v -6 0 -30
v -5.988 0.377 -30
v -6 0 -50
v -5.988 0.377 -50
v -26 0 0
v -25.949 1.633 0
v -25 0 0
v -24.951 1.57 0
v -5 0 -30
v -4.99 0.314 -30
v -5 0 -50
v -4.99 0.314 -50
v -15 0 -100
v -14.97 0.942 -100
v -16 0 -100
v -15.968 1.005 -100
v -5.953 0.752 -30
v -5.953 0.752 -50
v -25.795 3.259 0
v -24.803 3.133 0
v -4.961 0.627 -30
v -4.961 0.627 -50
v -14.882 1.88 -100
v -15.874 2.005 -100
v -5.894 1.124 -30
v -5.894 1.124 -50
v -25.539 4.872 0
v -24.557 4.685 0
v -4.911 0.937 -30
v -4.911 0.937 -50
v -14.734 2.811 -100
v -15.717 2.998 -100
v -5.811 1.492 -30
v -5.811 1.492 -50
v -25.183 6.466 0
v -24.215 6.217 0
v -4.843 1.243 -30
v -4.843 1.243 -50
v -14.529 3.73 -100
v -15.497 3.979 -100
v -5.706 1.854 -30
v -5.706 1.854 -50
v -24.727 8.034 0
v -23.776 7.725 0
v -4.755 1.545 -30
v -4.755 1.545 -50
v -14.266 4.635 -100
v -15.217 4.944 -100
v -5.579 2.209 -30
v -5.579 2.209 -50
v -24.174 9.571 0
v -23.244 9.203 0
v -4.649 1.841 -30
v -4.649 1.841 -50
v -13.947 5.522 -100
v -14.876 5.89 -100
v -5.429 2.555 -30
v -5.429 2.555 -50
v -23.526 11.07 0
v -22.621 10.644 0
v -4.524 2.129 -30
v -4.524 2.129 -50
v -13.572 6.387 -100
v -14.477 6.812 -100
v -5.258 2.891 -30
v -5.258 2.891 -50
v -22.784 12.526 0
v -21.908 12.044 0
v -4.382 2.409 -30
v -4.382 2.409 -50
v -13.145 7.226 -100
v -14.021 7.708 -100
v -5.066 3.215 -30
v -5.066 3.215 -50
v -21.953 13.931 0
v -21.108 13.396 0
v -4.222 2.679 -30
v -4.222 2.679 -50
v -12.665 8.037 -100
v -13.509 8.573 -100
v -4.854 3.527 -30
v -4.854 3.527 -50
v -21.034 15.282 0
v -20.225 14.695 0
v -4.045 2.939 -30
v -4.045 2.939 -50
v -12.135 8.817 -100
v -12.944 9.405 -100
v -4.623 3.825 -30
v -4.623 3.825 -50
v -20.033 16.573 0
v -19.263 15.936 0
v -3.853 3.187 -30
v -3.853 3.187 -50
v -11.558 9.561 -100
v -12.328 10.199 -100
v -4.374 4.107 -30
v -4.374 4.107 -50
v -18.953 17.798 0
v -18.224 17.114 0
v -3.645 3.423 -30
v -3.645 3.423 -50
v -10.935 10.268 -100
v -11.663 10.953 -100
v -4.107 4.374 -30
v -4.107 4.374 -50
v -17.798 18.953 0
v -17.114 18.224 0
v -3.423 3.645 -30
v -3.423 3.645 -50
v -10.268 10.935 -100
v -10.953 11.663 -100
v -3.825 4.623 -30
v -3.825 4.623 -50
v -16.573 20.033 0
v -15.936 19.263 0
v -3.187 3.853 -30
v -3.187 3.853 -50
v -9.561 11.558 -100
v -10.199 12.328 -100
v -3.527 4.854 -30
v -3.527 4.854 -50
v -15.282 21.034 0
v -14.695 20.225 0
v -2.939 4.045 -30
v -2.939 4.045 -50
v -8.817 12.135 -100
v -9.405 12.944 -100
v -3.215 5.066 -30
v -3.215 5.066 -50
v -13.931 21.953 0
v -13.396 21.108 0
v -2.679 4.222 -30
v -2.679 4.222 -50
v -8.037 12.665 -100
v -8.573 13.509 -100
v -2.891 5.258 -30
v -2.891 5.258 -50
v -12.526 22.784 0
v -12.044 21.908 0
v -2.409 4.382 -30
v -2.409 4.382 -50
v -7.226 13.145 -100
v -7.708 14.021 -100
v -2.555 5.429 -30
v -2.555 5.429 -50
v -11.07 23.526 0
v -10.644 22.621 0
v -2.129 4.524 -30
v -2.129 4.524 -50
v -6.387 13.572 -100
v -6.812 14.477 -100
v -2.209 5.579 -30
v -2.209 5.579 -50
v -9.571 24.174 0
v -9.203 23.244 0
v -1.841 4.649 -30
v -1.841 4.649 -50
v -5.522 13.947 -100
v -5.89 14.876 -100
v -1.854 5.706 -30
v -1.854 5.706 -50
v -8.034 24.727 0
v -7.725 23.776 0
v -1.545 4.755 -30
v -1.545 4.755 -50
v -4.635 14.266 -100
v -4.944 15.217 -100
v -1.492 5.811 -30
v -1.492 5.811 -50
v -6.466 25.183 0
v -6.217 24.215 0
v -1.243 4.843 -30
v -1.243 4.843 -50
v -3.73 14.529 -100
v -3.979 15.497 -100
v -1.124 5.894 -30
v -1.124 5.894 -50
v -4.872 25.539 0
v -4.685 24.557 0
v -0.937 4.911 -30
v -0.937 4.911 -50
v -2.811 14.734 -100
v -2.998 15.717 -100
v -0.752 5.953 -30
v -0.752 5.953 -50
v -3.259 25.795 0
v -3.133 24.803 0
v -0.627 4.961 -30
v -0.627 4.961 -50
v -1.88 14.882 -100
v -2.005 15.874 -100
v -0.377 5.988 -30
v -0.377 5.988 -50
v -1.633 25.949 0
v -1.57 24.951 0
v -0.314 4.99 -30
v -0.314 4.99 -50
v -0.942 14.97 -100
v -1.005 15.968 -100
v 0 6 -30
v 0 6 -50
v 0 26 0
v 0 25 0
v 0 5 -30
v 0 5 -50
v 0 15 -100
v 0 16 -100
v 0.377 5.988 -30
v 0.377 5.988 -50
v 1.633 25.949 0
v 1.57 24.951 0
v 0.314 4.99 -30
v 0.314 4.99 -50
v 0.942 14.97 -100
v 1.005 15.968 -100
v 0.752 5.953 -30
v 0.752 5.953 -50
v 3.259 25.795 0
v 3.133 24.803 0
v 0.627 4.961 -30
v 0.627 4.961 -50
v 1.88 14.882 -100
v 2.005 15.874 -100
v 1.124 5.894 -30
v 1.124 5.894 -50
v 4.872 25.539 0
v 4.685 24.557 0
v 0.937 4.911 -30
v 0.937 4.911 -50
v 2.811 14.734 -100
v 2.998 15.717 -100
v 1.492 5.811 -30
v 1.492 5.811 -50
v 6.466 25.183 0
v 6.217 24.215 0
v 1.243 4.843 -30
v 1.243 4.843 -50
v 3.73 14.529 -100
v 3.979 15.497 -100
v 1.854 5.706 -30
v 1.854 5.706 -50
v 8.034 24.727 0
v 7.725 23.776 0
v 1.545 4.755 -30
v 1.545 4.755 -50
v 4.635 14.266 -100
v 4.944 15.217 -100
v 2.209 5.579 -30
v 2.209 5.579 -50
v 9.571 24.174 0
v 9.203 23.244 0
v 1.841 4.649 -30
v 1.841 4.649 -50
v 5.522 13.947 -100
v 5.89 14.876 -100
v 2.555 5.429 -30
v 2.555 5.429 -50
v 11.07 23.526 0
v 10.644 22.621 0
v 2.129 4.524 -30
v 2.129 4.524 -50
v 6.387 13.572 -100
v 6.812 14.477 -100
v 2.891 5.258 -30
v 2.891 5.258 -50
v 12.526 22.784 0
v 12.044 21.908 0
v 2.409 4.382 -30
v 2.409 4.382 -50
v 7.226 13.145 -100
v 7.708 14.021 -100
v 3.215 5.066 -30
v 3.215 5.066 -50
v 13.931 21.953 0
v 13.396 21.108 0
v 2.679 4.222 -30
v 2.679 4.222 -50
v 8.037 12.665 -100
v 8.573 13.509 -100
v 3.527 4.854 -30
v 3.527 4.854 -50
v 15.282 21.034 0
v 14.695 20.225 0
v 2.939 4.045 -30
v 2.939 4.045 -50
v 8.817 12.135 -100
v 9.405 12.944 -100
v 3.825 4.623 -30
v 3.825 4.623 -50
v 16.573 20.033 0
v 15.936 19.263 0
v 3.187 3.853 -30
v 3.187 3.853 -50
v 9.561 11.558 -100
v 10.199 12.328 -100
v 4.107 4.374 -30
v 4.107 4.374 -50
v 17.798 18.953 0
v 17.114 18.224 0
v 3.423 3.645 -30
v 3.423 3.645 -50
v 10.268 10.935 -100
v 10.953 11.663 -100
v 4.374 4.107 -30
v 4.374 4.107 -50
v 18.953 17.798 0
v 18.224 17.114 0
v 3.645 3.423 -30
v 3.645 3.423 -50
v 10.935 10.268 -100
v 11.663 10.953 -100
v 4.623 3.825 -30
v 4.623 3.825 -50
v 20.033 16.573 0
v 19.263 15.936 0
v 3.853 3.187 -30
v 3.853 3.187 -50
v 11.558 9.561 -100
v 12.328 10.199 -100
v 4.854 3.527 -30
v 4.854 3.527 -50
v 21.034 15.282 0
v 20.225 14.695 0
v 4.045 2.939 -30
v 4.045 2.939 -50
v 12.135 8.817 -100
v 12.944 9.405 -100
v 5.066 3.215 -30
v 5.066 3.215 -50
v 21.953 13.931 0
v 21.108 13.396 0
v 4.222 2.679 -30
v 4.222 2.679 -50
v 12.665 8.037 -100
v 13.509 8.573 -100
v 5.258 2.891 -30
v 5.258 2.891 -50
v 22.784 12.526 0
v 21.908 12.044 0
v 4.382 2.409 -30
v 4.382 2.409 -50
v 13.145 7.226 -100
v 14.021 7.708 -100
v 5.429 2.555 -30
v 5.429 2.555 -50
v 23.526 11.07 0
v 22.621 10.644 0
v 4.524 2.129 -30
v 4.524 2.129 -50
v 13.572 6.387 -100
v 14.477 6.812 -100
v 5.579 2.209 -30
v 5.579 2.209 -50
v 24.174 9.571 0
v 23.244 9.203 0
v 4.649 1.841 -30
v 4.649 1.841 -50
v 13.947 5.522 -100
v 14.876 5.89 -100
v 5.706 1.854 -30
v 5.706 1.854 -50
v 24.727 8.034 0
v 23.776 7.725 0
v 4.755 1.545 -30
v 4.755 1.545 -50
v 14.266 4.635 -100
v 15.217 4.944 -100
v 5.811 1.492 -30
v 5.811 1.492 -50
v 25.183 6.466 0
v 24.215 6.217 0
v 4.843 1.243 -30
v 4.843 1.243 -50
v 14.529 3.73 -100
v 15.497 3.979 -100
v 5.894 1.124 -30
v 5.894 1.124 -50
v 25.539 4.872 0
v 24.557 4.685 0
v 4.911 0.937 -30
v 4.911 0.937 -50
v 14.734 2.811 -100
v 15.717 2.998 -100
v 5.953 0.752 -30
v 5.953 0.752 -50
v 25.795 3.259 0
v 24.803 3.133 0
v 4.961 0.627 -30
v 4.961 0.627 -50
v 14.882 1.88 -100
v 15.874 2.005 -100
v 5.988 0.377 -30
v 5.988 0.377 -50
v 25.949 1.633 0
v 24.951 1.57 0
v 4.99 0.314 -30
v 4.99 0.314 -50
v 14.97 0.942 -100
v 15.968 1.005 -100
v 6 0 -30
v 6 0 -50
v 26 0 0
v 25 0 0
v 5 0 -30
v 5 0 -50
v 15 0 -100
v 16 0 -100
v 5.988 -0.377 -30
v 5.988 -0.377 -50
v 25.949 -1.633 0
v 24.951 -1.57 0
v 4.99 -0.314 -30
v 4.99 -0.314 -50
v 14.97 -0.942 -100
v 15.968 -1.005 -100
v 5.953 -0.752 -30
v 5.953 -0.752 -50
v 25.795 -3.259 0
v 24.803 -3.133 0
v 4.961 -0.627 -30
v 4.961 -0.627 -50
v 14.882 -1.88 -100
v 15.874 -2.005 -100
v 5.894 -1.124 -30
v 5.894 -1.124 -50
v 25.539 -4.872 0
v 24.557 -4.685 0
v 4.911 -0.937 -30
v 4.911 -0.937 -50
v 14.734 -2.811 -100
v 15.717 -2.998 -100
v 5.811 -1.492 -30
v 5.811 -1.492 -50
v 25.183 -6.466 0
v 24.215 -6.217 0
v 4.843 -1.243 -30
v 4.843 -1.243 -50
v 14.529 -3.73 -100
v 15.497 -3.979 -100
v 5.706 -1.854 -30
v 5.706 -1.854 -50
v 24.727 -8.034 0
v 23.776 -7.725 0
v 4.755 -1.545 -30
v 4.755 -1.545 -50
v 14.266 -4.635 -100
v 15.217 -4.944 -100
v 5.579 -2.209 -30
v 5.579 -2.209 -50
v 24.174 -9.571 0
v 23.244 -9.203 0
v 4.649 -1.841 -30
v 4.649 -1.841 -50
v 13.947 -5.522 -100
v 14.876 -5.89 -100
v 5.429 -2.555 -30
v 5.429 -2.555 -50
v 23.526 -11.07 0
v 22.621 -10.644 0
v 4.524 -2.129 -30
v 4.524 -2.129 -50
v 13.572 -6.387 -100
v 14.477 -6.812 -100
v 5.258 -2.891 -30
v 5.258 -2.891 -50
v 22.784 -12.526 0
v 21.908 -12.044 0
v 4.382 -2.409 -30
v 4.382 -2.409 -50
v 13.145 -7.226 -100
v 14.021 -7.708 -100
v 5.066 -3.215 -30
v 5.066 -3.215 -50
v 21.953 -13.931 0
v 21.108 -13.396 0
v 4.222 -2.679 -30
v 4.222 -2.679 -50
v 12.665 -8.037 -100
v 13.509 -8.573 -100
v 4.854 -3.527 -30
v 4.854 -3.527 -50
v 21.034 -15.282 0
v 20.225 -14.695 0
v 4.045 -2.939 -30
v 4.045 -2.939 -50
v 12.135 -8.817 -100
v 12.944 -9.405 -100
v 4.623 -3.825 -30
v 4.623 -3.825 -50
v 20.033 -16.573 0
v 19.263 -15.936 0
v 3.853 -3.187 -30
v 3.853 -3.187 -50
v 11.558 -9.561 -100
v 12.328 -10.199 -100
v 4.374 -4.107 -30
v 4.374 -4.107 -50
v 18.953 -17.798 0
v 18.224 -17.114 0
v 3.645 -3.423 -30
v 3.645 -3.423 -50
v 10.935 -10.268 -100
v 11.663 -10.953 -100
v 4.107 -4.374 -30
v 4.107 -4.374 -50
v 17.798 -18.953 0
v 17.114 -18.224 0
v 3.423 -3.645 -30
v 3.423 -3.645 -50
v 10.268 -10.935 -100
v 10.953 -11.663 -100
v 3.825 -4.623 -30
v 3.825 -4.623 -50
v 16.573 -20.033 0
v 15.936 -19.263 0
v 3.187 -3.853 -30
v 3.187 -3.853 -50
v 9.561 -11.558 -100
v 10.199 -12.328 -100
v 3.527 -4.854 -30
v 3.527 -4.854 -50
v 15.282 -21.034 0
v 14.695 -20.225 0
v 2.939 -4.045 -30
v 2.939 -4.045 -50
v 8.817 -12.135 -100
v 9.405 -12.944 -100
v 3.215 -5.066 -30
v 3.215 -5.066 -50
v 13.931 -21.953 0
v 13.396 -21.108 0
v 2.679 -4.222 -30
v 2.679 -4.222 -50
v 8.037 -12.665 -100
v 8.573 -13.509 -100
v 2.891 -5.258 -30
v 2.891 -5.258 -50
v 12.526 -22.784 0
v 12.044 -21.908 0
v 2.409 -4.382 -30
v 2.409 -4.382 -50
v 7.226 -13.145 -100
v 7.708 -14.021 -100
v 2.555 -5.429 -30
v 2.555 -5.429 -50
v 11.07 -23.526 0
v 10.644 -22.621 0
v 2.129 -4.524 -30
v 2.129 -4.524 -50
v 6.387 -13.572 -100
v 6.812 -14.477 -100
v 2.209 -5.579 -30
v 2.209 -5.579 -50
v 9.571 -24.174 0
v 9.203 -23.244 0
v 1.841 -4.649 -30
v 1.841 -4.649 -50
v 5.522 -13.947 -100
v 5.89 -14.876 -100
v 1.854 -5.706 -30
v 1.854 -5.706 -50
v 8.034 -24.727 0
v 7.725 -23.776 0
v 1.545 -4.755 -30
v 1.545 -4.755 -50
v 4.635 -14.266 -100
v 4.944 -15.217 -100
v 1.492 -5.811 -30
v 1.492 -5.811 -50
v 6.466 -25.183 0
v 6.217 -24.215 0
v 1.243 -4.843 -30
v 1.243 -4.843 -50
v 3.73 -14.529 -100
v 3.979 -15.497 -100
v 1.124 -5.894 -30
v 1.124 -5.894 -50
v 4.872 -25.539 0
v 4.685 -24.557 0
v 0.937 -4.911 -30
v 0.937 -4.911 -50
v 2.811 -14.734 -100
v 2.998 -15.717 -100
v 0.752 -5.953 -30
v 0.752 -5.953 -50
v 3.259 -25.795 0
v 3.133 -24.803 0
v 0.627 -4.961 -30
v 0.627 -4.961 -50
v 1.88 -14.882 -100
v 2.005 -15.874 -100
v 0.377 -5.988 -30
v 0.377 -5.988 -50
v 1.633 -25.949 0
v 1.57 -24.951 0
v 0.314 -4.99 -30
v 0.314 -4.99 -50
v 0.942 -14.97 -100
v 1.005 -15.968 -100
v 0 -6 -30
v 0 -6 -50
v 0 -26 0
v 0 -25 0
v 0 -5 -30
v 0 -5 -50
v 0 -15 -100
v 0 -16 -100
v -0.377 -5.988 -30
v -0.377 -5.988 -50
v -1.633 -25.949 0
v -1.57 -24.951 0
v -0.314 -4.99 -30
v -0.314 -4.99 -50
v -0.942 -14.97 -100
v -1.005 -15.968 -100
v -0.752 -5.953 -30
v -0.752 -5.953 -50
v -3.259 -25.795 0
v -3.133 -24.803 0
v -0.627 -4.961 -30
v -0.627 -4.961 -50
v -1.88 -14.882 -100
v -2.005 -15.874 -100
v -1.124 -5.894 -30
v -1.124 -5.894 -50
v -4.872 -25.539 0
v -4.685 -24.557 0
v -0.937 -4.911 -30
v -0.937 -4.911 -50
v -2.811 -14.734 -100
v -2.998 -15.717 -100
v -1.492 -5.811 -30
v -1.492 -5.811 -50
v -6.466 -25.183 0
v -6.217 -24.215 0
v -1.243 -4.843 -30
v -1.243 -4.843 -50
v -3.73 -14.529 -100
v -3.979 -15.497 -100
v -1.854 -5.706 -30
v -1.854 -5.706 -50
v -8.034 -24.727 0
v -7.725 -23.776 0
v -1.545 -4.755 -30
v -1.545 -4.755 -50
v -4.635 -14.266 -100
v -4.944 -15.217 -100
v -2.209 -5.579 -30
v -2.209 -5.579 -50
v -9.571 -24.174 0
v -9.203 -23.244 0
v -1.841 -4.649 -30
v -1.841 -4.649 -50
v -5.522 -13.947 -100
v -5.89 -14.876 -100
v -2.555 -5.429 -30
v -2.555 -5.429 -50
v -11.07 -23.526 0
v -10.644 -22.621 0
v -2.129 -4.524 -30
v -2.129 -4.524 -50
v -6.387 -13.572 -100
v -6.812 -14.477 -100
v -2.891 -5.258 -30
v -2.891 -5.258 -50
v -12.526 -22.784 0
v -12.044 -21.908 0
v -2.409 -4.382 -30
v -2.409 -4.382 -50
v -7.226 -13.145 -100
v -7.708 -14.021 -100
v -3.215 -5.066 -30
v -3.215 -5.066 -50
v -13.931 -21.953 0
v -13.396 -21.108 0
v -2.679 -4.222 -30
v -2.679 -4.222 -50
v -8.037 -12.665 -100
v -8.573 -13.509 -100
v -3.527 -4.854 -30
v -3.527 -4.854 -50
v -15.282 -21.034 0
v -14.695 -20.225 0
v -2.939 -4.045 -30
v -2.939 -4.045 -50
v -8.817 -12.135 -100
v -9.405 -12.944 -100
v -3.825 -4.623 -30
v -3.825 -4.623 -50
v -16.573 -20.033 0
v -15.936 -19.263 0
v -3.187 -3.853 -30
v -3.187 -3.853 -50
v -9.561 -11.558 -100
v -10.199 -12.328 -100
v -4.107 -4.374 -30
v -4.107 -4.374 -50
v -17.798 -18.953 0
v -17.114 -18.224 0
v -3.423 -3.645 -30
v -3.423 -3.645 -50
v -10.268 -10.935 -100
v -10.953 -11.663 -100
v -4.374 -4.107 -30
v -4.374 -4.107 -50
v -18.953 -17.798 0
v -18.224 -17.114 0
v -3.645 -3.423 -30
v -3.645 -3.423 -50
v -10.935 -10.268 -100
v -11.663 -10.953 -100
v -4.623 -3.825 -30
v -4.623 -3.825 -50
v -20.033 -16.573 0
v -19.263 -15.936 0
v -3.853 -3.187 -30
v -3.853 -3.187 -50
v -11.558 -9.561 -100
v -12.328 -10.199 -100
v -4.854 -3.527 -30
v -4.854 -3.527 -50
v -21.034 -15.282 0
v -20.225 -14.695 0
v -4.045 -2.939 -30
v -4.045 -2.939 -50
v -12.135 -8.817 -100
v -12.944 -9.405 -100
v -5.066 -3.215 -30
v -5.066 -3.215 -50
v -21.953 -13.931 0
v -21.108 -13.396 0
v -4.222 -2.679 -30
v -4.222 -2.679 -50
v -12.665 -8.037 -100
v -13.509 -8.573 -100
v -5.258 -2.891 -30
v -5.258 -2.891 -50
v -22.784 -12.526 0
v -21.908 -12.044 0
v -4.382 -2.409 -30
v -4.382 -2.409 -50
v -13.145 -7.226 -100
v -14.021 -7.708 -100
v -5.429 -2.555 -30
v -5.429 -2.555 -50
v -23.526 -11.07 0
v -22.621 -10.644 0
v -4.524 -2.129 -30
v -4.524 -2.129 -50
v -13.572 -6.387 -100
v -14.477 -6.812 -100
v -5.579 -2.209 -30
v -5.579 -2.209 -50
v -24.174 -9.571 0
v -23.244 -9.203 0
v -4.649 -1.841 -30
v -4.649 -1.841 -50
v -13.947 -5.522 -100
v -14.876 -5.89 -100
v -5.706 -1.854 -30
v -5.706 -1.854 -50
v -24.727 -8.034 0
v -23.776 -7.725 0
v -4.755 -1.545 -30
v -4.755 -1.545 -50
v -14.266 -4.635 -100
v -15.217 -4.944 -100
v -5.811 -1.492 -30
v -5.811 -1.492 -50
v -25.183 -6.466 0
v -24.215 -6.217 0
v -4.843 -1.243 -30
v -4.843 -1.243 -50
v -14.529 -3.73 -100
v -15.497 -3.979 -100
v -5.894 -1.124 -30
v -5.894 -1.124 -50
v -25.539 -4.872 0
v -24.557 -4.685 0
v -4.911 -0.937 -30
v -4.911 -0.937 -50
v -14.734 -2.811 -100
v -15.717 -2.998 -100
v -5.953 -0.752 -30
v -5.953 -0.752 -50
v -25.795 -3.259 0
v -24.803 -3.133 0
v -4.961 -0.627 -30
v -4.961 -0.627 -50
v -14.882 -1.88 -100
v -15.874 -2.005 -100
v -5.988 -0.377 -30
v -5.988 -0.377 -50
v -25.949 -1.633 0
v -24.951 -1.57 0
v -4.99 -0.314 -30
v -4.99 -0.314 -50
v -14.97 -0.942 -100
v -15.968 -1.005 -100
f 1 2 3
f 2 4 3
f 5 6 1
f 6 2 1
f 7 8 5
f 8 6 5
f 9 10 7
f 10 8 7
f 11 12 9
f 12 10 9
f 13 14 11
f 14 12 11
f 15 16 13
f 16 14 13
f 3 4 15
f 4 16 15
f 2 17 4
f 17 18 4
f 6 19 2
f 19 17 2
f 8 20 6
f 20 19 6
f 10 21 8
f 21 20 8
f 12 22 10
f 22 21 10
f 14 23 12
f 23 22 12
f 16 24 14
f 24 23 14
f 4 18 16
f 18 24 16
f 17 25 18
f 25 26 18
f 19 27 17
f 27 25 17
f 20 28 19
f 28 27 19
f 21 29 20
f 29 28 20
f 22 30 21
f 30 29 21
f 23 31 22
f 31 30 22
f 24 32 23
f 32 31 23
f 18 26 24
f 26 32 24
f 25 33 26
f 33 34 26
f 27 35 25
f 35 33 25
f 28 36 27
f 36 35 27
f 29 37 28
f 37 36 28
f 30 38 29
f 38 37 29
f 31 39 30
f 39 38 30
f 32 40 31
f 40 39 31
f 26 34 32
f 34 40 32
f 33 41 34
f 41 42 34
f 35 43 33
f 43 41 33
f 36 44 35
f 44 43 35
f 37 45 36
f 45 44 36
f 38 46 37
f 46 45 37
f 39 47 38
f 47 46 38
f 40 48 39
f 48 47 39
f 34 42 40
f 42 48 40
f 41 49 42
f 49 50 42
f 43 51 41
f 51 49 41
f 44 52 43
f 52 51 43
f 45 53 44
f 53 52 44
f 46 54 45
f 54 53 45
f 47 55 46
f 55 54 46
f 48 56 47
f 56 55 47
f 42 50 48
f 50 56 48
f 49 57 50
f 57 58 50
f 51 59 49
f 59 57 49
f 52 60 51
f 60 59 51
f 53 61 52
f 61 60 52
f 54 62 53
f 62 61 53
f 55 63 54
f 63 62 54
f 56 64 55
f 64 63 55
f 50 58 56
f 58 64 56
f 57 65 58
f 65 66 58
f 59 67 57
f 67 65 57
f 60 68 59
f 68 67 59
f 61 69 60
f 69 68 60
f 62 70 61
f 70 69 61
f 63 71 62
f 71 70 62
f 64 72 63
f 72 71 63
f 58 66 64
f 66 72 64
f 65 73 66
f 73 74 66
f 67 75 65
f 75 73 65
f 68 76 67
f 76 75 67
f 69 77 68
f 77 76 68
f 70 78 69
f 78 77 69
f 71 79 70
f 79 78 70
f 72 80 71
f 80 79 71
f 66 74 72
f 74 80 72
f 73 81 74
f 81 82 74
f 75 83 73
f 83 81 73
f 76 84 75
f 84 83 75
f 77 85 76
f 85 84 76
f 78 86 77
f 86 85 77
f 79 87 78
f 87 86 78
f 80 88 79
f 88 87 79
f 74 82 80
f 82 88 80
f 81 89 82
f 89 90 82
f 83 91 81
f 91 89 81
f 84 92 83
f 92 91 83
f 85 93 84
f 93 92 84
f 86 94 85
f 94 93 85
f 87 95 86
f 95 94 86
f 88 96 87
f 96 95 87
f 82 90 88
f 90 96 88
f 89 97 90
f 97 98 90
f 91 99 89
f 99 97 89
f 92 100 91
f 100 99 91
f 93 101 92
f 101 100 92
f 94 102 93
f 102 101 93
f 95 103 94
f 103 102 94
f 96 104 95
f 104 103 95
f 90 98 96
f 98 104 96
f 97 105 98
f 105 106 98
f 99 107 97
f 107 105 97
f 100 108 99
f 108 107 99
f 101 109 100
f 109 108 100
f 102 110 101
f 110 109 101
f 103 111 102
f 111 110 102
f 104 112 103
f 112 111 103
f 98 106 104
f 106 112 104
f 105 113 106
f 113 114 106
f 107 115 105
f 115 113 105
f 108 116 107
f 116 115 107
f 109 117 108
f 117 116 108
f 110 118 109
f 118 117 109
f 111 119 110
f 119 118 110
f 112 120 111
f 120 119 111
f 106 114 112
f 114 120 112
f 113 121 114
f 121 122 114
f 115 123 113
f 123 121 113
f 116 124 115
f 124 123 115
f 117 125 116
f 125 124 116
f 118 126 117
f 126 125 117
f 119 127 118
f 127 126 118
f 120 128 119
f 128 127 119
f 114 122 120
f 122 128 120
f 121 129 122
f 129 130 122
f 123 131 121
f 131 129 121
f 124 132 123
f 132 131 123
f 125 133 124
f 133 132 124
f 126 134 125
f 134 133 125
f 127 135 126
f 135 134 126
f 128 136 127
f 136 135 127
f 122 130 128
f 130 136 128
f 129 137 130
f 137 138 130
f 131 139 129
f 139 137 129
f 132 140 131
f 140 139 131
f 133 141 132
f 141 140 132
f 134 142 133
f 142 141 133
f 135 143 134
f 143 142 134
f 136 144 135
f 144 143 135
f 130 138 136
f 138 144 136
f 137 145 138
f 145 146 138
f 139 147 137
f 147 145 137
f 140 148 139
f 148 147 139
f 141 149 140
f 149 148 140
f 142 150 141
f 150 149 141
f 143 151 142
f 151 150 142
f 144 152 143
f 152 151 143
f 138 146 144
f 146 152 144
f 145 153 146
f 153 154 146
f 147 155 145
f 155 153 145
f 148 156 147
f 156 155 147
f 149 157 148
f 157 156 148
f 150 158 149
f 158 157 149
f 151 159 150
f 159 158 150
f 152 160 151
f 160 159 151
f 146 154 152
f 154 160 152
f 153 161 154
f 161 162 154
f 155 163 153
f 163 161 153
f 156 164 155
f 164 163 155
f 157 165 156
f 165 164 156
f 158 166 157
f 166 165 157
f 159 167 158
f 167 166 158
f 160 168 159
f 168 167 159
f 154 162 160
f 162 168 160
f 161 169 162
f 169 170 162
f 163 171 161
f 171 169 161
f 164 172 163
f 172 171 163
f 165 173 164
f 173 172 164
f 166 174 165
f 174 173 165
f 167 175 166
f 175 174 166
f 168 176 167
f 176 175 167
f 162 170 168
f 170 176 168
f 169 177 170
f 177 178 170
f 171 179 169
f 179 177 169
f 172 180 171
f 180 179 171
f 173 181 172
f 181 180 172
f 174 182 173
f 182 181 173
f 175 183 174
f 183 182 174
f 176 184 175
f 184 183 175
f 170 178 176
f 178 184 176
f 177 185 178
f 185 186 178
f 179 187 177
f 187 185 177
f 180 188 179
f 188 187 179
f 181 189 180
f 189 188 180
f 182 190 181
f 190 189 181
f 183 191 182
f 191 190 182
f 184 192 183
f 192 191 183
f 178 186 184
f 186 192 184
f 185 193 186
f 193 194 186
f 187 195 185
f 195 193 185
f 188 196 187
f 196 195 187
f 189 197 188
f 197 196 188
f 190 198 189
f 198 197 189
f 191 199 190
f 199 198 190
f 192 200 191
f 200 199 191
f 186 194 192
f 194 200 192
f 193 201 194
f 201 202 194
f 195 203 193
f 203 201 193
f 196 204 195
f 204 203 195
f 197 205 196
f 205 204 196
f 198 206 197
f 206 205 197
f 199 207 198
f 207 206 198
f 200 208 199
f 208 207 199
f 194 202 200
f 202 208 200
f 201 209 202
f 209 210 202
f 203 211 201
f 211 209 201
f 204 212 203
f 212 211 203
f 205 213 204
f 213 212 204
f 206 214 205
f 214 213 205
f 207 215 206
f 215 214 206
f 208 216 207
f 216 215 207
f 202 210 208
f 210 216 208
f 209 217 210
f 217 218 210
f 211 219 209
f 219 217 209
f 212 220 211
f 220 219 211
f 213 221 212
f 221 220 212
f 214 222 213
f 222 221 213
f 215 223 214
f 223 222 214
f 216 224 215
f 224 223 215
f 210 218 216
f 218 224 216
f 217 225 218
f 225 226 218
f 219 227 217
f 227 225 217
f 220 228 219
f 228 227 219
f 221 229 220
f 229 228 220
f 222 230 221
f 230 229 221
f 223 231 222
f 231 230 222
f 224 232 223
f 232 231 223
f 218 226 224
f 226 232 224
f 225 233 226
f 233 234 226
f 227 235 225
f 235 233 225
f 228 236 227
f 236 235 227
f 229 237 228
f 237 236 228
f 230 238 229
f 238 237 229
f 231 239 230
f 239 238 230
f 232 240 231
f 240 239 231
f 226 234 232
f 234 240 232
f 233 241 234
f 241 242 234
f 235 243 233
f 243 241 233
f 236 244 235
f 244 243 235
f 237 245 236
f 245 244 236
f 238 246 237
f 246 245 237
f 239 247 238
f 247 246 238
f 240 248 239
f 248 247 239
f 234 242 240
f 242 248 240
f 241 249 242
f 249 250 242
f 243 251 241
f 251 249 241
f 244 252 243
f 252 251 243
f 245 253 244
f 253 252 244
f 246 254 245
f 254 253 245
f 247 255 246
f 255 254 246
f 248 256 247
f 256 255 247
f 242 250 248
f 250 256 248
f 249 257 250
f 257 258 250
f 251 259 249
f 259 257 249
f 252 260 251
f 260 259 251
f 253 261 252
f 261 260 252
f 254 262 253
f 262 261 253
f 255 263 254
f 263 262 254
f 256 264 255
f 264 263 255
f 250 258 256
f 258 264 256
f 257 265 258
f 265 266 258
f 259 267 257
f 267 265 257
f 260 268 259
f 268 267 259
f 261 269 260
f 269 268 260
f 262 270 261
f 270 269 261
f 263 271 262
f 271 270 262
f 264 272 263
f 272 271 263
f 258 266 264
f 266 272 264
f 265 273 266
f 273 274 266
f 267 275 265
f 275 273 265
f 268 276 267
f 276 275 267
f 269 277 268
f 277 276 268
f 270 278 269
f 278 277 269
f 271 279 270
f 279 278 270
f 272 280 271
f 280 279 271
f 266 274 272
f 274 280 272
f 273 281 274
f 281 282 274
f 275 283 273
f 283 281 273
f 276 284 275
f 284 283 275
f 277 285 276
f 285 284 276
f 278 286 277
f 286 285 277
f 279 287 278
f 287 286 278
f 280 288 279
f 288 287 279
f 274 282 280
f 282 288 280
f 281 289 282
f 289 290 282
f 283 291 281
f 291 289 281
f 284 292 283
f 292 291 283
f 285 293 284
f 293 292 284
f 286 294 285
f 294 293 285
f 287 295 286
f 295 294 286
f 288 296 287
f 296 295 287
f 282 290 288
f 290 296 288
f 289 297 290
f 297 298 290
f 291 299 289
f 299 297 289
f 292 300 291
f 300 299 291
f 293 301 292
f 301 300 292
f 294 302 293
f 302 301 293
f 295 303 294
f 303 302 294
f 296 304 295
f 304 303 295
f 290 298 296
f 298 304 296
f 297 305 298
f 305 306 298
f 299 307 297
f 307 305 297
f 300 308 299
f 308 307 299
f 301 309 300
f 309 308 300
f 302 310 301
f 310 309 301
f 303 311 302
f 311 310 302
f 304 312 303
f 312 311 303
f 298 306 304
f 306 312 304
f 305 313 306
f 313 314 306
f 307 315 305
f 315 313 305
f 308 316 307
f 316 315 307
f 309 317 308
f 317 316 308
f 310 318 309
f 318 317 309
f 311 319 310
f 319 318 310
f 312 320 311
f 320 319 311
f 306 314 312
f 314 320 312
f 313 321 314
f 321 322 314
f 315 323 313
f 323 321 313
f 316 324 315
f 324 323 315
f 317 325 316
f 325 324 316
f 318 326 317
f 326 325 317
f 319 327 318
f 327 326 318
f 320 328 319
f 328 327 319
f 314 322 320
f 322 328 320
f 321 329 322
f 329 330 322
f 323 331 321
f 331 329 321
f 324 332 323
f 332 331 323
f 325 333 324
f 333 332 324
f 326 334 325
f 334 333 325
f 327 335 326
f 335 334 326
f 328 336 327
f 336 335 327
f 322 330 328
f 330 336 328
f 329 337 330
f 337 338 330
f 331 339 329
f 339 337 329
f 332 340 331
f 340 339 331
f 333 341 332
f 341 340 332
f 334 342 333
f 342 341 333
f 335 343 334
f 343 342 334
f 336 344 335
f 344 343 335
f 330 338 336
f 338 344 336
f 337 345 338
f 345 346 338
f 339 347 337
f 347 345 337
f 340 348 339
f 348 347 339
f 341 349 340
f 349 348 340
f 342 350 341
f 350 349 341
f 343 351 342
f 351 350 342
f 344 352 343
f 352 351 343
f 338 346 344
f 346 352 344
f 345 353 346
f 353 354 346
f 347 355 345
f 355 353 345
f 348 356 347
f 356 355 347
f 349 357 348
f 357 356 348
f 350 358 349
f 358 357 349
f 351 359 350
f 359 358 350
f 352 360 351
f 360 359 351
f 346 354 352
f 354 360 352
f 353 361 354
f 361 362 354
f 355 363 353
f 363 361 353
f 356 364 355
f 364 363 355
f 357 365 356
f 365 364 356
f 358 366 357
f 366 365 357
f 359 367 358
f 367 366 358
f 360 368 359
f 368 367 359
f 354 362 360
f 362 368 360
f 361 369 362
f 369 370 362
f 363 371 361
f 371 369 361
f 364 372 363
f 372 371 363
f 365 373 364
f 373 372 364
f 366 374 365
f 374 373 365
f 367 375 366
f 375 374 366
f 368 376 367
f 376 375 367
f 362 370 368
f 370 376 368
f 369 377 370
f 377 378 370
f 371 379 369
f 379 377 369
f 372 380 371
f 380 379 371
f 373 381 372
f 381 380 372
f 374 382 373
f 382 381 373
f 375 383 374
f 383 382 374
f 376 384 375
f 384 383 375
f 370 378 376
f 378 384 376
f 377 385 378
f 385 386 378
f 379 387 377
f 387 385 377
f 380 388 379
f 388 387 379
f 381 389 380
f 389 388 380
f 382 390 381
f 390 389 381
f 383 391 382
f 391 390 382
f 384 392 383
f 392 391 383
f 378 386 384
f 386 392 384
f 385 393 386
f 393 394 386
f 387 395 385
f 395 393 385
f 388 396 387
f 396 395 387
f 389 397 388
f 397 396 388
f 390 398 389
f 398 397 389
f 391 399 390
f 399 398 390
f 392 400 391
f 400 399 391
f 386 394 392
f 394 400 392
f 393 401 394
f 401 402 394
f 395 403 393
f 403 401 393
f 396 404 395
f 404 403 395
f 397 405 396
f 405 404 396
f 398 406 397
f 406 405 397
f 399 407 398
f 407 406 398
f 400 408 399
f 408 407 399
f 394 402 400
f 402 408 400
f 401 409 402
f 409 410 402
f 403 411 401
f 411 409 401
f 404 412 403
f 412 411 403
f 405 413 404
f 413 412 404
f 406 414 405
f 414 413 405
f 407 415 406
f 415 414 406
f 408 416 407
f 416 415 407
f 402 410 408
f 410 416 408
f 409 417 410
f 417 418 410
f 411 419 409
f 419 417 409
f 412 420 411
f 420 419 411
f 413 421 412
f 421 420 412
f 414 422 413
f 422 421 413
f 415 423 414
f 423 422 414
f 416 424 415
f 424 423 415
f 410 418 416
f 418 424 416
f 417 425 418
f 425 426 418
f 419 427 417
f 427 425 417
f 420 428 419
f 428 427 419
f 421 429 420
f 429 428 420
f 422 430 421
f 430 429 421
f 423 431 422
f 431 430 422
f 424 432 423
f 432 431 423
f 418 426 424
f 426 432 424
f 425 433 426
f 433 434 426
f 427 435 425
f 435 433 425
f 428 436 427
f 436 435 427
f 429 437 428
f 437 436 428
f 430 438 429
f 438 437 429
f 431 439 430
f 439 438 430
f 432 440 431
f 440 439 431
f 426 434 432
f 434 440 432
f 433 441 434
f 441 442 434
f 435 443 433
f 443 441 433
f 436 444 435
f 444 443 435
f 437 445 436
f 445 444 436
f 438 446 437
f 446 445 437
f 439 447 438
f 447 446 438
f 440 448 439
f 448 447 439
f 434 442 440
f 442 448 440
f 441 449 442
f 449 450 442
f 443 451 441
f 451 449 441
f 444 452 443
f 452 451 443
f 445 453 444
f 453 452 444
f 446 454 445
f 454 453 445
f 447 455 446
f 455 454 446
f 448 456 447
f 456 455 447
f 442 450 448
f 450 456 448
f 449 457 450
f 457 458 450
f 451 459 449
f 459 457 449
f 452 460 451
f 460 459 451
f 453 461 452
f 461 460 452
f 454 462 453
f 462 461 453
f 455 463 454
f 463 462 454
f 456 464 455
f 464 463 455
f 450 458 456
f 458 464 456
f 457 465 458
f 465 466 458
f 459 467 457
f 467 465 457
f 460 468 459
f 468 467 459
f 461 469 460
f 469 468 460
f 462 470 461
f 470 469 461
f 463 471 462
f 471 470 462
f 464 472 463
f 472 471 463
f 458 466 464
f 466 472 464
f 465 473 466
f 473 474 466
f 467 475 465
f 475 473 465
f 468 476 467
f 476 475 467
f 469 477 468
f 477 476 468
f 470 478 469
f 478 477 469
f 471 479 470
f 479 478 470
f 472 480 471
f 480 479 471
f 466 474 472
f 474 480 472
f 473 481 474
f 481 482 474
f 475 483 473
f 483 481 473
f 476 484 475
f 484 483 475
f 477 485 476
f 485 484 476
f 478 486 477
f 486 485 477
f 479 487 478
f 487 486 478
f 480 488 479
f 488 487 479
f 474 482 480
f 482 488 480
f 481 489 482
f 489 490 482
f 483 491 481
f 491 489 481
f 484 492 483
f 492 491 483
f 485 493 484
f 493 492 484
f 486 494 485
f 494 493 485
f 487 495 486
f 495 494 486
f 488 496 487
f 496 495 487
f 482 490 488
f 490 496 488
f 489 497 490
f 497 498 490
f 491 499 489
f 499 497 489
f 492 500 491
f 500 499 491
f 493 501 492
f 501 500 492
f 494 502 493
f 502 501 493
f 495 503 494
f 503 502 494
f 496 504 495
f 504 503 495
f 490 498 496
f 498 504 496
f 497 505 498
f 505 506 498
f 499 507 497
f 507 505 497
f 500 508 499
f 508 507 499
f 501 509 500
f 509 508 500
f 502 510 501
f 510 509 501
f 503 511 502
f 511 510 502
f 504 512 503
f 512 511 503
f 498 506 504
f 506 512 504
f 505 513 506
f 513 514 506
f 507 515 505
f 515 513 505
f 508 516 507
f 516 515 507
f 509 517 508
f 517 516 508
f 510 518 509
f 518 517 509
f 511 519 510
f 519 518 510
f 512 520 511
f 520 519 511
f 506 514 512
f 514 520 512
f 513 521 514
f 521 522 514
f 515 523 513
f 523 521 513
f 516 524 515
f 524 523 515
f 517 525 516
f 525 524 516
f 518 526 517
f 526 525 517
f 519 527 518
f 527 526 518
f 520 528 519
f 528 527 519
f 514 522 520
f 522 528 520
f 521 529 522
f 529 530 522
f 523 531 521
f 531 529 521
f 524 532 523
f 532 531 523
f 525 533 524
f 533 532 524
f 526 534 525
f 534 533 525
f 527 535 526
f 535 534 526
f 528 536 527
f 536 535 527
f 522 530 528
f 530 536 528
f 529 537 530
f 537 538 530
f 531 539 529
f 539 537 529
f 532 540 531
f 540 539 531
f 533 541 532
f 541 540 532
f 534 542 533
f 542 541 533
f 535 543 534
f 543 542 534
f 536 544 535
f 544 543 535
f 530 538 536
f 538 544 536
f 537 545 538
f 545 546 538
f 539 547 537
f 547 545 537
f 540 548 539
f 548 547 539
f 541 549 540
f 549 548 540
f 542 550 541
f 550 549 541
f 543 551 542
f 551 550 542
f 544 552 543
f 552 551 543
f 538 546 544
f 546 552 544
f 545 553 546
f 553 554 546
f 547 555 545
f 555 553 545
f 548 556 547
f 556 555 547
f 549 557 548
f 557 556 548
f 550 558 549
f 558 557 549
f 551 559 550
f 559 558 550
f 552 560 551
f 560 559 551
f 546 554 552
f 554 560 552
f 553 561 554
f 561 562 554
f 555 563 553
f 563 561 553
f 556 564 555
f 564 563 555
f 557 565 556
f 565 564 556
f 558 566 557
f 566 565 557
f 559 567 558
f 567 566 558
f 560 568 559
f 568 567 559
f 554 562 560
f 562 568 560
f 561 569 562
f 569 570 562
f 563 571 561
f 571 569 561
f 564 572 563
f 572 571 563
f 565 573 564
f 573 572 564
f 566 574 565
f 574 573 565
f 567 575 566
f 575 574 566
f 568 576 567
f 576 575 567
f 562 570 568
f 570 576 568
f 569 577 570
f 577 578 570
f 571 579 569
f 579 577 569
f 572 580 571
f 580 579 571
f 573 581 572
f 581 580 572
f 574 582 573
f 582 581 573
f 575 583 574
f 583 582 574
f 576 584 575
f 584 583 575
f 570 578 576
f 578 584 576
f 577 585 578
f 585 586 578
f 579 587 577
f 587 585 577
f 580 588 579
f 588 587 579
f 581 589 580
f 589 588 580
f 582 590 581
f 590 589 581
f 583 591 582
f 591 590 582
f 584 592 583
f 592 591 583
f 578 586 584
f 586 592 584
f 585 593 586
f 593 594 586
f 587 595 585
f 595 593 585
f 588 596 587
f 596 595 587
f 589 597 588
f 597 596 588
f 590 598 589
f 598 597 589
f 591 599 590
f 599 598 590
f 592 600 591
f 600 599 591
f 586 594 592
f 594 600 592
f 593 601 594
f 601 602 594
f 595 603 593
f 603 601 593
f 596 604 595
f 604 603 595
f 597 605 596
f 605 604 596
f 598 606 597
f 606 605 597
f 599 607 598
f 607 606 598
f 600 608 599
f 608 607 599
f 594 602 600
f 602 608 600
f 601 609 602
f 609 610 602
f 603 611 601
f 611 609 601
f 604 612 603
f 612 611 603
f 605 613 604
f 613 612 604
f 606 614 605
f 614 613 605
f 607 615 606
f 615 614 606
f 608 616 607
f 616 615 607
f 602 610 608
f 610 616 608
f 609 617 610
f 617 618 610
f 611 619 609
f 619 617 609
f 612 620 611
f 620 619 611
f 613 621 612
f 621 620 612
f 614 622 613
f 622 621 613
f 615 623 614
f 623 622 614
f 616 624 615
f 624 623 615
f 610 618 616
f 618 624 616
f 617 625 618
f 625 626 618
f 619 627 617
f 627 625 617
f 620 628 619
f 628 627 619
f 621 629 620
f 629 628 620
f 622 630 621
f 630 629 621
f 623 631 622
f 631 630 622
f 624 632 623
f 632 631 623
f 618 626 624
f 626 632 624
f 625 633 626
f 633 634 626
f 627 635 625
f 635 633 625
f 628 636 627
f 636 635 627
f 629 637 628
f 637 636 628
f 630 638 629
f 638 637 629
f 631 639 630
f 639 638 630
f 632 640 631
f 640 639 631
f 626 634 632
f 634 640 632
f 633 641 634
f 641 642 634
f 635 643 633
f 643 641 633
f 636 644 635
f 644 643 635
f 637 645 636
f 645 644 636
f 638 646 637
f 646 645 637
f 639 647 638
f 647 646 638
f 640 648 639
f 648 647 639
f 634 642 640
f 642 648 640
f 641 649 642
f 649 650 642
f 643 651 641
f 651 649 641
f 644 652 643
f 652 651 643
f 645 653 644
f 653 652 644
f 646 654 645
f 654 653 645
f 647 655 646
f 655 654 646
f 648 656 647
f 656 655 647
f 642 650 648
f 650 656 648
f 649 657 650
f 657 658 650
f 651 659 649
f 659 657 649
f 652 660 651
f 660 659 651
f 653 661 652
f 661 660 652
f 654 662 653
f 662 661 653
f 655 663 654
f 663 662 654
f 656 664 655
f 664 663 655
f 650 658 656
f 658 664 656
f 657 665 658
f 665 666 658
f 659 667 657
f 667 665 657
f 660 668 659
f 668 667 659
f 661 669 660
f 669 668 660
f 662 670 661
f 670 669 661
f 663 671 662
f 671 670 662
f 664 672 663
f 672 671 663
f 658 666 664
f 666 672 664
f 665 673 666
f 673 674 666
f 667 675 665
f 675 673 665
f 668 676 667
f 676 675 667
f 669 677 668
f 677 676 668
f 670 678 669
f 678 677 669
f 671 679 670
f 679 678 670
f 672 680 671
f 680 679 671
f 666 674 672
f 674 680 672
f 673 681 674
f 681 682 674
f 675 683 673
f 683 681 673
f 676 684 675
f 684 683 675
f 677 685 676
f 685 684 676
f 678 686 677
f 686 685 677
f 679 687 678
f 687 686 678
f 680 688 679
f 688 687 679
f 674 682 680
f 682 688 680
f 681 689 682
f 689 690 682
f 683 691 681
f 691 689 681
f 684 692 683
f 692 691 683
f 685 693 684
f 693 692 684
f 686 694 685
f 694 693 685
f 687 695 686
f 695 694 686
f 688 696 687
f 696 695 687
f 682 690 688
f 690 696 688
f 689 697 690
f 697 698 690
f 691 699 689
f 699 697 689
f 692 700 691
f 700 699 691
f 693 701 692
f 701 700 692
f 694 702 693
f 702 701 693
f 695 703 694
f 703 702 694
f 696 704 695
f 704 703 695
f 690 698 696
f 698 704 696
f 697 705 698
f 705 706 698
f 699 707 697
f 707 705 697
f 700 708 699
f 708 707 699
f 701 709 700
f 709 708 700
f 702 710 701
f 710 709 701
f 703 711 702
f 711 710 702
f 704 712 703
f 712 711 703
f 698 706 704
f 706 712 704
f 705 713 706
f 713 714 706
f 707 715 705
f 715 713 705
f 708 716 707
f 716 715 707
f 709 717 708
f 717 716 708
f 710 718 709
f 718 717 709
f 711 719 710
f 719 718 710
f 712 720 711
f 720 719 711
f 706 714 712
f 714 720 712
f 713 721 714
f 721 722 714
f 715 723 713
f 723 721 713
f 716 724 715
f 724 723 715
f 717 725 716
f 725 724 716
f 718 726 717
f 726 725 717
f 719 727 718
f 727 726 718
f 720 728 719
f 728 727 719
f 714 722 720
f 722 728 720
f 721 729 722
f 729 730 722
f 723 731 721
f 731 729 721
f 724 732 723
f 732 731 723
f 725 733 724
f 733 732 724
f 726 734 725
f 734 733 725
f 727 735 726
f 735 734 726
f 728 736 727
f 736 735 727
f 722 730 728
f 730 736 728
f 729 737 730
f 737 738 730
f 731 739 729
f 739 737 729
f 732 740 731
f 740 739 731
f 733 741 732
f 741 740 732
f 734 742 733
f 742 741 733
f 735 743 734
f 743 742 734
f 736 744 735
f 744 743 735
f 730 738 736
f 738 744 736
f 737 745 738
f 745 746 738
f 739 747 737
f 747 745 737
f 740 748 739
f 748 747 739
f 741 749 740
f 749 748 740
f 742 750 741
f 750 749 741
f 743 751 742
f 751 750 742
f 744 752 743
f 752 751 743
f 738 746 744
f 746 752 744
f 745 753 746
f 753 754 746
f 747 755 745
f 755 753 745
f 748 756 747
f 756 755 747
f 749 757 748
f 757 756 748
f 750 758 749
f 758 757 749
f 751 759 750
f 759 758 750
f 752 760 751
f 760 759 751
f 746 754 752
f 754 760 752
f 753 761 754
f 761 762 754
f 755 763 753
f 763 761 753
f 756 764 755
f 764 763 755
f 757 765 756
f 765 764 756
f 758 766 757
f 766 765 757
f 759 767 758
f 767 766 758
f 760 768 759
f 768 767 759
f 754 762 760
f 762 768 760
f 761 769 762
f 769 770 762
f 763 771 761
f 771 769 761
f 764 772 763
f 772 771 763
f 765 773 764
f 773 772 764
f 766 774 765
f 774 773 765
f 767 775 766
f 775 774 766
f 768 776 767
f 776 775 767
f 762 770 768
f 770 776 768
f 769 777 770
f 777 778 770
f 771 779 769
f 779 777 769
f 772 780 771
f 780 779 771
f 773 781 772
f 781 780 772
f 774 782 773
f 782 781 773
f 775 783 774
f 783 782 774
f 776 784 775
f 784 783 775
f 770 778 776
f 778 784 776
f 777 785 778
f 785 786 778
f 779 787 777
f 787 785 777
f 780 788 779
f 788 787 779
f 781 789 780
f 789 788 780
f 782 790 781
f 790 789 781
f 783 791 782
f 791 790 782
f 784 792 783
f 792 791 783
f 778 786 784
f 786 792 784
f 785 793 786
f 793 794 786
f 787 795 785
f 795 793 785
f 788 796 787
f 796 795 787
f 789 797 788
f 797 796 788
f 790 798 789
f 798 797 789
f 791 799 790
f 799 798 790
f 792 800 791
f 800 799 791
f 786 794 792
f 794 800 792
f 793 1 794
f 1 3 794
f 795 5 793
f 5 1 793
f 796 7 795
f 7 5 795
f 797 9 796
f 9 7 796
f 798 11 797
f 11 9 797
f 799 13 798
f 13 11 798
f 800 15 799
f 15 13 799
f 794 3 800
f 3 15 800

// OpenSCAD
// Venturi tube patterns.

/* --Linear Tube profile-- */
let(
    il = 0,
    id = 1,
    tl = 2,
    td = 3,
    ol = 4,
    od = 5
);
function vp_lt_params(
    inlet_length=50,
    inlet_diameter=50,
    throat_length=20,
    throat_diameter=20,
    outlet_length=30,
    outlet_diameter=30,
) = [inlet_length,  inlet_diameter,
     throat_length, throat_diameter,
     outlet_length, outlet_diameter,
      sections];


module vp_lt_body(
    inlet_length=30,
    inlet_diameter=50,
    throat_length=20,
    throat_diameter=10,
    outlet_length=50,
    outlet_diameter=30,
    wall_thickness = 1
){
    inlet_st  = [inlet_diameter/2,0];
    throat_st = [throat_diameter/2,-inlet_length];
    throat_ed = throat_st - [0,throat_length];
    outlet_ed = [outlet_diameter/2,throat_ed.y-outlet_length];
    
    pt = [inlet_st,throat_st,throat_ed,outlet_ed];
    vertexes = concat(pt,
    [for (i = [len(pt)-1:-1:0])pt[i]+[wall_thickness,0]]);
    echo(pt);
    echo(vertexes);
    polygon(vertexes);
}

rotate_extrude($fn=100)
vp_lt_body(); 

    
